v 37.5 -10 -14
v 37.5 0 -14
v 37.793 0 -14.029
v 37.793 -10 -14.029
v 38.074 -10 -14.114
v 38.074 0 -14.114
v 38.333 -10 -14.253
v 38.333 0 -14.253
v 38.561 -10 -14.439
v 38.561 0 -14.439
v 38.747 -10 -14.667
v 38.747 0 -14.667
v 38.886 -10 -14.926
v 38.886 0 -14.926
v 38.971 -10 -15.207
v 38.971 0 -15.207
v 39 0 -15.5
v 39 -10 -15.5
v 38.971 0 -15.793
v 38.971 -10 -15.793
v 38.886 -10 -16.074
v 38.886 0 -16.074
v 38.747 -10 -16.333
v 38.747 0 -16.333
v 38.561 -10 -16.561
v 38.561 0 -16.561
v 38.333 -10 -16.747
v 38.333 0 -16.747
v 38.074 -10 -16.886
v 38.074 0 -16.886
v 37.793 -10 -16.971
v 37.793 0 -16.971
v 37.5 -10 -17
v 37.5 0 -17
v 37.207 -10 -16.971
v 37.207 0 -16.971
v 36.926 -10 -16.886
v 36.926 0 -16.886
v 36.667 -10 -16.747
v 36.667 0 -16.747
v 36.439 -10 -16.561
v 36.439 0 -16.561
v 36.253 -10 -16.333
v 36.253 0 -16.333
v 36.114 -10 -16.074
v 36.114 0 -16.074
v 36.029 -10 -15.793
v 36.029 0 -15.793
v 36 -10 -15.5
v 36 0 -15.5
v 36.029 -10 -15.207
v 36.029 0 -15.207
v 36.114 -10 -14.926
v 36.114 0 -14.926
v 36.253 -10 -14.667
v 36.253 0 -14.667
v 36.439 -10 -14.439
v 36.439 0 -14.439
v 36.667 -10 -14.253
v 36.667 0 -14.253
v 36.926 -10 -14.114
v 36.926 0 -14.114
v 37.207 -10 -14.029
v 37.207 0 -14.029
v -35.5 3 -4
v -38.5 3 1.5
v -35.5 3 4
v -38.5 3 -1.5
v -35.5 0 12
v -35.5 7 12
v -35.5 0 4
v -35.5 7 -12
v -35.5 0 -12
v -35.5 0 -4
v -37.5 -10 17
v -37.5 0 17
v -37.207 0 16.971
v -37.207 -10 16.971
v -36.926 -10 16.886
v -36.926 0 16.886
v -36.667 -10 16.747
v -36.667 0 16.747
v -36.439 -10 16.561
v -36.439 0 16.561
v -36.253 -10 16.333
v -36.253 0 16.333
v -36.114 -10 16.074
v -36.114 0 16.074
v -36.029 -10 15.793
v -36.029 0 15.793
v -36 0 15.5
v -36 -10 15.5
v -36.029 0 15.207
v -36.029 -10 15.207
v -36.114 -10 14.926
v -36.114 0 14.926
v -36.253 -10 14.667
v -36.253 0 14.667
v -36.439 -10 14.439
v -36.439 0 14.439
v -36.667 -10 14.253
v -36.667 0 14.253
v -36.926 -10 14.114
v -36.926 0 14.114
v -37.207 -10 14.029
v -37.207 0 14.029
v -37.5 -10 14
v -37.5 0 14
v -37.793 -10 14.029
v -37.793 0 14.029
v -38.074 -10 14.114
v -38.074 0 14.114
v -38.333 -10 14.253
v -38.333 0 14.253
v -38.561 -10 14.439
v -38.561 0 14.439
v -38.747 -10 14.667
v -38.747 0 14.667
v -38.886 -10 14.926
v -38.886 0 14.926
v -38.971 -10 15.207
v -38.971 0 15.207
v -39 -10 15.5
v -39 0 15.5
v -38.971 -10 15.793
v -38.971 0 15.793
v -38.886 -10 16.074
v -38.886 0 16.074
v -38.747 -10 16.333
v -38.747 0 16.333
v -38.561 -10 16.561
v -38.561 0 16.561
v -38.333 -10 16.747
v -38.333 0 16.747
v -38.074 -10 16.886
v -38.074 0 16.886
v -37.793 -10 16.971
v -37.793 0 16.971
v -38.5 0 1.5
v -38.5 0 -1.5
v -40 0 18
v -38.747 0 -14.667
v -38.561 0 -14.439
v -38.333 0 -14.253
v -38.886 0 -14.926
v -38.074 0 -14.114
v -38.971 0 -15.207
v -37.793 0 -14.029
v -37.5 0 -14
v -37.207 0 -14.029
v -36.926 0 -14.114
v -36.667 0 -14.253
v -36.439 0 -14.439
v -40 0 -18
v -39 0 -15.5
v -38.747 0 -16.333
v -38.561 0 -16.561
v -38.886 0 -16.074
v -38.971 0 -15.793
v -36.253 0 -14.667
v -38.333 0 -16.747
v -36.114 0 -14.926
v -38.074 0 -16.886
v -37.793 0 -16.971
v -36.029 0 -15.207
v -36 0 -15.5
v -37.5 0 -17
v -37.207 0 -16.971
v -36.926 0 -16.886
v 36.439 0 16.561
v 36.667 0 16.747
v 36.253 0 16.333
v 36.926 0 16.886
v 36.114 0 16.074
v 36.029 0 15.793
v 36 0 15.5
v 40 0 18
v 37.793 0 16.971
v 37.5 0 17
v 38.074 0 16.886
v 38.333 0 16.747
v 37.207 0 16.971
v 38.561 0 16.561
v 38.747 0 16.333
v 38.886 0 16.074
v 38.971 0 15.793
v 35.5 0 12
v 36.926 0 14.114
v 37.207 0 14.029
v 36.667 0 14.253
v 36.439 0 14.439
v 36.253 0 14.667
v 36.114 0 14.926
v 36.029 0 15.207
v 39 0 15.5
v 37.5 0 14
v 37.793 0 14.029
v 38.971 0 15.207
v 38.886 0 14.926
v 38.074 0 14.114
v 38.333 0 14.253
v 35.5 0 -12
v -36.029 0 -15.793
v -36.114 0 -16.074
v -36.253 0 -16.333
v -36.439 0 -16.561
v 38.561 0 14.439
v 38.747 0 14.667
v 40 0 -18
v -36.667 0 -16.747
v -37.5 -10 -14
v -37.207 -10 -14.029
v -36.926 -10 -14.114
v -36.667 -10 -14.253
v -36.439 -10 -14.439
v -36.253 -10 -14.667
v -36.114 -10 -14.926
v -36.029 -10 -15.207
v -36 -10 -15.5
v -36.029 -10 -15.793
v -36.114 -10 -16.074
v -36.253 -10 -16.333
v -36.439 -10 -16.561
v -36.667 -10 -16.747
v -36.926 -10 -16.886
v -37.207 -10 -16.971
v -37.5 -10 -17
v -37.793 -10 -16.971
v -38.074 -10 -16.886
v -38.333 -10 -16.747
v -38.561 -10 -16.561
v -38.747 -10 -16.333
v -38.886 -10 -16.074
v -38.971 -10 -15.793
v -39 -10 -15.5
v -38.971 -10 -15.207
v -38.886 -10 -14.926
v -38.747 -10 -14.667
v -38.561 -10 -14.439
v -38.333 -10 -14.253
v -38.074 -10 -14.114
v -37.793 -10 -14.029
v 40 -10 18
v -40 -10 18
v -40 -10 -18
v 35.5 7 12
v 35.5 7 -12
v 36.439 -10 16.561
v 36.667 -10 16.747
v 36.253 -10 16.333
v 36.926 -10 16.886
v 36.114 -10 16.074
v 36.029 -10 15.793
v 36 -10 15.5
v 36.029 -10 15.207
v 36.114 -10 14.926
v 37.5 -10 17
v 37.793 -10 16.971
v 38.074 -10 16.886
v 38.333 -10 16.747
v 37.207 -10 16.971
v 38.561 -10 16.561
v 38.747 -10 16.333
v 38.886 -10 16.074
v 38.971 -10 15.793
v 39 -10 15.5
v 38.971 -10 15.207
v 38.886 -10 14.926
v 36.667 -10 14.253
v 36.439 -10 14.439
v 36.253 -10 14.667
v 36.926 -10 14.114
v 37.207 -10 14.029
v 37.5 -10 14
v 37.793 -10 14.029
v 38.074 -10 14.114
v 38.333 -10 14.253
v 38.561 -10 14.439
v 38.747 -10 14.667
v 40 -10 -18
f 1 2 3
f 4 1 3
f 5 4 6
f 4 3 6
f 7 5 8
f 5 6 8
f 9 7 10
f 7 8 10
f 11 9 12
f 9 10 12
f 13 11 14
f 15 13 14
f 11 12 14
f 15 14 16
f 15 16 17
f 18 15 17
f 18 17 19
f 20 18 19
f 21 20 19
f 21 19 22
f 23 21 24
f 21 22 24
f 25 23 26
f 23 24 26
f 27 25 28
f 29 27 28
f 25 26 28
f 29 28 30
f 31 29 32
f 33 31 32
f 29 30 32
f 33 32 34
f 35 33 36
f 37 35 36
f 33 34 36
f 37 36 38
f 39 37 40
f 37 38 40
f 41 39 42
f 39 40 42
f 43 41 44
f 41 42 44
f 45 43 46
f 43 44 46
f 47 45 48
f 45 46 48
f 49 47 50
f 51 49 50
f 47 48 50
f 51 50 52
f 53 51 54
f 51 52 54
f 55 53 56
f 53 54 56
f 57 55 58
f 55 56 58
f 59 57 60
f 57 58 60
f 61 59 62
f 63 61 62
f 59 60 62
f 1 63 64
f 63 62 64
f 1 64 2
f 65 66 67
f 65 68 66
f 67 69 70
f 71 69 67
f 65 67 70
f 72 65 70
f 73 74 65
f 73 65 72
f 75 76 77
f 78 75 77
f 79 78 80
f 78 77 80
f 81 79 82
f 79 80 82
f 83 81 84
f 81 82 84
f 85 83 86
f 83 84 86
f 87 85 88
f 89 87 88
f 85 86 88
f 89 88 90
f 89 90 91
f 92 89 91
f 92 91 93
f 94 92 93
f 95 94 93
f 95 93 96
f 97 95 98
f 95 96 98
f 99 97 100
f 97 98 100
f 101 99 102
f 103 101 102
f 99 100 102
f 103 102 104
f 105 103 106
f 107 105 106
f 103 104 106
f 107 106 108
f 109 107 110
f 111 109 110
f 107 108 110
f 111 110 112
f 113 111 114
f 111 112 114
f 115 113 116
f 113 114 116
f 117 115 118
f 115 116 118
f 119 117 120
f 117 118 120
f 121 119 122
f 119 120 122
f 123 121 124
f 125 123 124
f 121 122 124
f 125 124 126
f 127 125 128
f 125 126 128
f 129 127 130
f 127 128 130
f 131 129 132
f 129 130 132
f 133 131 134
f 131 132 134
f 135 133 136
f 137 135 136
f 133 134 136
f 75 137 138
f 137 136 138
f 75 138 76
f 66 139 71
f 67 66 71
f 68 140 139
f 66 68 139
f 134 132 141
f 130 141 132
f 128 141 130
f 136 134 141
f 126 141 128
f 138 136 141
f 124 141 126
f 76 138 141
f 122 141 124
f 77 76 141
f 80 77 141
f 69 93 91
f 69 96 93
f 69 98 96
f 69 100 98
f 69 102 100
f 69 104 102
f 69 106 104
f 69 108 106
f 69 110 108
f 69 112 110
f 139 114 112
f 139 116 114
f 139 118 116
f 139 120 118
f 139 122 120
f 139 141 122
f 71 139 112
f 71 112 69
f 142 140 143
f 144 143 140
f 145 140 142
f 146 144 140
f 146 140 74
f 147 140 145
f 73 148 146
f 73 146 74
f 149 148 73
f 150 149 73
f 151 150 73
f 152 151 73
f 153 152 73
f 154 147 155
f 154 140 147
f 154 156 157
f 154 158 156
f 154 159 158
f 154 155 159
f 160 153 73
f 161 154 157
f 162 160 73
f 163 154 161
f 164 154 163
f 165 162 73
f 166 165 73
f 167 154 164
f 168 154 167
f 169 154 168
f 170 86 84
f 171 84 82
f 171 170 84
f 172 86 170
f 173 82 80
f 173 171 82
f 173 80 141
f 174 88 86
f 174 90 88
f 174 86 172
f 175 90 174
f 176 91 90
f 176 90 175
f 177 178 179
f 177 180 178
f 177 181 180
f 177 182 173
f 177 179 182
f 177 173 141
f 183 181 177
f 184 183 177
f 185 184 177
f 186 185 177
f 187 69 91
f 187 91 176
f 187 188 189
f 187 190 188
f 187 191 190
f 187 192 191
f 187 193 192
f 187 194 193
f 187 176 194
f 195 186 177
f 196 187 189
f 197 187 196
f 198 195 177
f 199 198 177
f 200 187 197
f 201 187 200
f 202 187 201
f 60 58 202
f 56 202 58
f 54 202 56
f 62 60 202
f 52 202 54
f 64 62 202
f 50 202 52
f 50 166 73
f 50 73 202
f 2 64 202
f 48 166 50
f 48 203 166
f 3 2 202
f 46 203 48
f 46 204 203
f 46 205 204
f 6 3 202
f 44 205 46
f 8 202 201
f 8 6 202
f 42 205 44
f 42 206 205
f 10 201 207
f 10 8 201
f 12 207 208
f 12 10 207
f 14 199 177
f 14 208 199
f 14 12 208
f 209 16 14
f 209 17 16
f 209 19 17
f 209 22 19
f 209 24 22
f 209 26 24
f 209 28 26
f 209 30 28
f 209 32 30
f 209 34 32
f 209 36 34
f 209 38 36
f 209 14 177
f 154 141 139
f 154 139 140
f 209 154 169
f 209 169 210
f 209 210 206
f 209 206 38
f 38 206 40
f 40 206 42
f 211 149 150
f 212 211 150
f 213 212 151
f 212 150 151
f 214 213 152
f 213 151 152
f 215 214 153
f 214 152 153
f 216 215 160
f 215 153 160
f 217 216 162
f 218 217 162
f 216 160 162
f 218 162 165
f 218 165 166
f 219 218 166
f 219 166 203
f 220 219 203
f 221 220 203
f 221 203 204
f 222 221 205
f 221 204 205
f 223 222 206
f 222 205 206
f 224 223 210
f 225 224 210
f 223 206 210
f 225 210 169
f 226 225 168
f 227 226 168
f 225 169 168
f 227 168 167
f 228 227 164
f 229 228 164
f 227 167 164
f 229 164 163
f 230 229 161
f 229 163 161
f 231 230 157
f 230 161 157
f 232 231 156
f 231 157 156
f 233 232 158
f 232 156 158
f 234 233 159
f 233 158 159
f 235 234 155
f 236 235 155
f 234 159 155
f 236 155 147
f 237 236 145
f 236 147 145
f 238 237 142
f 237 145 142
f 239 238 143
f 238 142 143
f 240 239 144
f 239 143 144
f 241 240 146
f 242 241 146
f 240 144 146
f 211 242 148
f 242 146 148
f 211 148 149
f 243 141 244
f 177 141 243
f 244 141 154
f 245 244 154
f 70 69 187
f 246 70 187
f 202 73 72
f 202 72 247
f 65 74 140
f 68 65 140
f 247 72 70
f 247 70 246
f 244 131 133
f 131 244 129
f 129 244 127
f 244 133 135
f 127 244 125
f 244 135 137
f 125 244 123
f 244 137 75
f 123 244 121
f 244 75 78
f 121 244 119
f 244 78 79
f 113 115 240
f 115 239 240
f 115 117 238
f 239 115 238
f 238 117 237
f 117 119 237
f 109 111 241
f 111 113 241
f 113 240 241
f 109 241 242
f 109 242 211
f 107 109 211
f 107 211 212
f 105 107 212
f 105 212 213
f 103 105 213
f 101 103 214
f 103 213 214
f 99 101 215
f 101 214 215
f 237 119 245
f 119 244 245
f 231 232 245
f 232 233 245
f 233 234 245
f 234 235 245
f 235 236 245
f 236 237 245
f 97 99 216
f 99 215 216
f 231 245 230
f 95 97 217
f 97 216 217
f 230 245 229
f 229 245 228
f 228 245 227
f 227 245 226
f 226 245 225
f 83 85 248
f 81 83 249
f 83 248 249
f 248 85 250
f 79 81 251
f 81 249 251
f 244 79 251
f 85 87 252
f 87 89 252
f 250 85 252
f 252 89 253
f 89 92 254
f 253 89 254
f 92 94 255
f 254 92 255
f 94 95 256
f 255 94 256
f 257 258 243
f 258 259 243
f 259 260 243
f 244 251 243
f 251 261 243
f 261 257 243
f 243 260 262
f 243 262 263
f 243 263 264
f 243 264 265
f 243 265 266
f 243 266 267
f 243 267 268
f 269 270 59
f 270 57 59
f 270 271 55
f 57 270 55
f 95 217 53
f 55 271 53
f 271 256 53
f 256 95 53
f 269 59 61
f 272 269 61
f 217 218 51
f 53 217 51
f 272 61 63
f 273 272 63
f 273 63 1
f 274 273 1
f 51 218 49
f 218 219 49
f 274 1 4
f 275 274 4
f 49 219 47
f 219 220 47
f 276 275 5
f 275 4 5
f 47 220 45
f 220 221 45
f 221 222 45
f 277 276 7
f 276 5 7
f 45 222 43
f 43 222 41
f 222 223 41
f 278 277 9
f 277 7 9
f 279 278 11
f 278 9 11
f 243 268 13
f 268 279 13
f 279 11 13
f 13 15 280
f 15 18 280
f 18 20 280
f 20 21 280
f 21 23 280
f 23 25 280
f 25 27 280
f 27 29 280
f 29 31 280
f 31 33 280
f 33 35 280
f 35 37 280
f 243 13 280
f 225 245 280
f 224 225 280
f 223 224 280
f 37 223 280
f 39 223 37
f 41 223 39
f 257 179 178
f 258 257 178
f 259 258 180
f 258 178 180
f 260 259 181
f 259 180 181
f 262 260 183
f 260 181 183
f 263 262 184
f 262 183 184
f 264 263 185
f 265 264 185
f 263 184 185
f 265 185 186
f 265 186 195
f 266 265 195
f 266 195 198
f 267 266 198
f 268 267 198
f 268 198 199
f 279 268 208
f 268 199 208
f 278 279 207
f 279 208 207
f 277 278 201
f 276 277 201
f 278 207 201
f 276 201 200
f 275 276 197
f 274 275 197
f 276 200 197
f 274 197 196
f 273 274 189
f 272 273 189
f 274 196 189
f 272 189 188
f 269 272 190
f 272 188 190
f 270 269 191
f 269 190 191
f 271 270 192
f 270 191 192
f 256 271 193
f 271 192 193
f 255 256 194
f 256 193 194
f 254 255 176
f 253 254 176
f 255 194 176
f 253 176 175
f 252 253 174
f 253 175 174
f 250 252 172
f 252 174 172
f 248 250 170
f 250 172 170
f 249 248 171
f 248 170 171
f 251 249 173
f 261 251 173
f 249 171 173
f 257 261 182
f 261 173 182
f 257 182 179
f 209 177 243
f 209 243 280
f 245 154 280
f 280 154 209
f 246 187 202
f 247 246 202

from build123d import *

# Parameters (mm, degrees)
SKETCH1_W           = 80
SKETCH1_H           = 36
SKETCH1_R           = 1.5
BOSS_EXTRUDE1_DEPTH = 10
SKETCH1_3_W         = 71
SKETCH1_3_H         = 24
BOSS_EXTRUDE2_DEPTH = 7
BOSS_EXTRUDE3_DEPTH = 3


with BuildPart() as part:
    # Sketch1 → Boss-Extrude1 (new body)
    with BuildSketch(Plane(origin=(0, 0, 0), x_dir=(1, 0, 0), z_dir=(0, 1, 0))):
        Rectangle(SKETCH1_W, SKETCH1_H)
        with Locations((-37.5, -15.5)):
            Circle(SKETCH1_R, mode=Mode.SUBTRACT)
        with Locations((37.5, -15.5)):
            Circle(SKETCH1_R, mode=Mode.SUBTRACT)
        with Locations((-37.5, 15.5)):
            Circle(SKETCH1_R, mode=Mode.SUBTRACT)
        with Locations((37.5, 15.5)):
            Circle(SKETCH1_R, mode=Mode.SUBTRACT)
    extrude(amount=-BOSS_EXTRUDE1_DEPTH)

    # Sketch1<3> → Boss-Extrude2 (add)
    with BuildSketch(Plane(origin=(0, 0, 0), x_dir=(1, 0, 0), z_dir=(0, 1, 0))):
        Rectangle(SKETCH1_3_W, SKETCH1_3_H)
    extrude(amount=BOSS_EXTRUDE2_DEPTH)

    # Sketch2 → Boss-Extrude3 (add)
    with BuildSketch(Plane(origin=(0, 0, 0), x_dir=(1, 0, 0), z_dir=(0, 1, 0))):
        Polygon((-38.5, -1.5), (-35.5, -4), (-35.5, 4), (-38.5, 1.5), align=None)
    extrude(amount=BOSS_EXTRUDE3_DEPTH)


solid = part.part
